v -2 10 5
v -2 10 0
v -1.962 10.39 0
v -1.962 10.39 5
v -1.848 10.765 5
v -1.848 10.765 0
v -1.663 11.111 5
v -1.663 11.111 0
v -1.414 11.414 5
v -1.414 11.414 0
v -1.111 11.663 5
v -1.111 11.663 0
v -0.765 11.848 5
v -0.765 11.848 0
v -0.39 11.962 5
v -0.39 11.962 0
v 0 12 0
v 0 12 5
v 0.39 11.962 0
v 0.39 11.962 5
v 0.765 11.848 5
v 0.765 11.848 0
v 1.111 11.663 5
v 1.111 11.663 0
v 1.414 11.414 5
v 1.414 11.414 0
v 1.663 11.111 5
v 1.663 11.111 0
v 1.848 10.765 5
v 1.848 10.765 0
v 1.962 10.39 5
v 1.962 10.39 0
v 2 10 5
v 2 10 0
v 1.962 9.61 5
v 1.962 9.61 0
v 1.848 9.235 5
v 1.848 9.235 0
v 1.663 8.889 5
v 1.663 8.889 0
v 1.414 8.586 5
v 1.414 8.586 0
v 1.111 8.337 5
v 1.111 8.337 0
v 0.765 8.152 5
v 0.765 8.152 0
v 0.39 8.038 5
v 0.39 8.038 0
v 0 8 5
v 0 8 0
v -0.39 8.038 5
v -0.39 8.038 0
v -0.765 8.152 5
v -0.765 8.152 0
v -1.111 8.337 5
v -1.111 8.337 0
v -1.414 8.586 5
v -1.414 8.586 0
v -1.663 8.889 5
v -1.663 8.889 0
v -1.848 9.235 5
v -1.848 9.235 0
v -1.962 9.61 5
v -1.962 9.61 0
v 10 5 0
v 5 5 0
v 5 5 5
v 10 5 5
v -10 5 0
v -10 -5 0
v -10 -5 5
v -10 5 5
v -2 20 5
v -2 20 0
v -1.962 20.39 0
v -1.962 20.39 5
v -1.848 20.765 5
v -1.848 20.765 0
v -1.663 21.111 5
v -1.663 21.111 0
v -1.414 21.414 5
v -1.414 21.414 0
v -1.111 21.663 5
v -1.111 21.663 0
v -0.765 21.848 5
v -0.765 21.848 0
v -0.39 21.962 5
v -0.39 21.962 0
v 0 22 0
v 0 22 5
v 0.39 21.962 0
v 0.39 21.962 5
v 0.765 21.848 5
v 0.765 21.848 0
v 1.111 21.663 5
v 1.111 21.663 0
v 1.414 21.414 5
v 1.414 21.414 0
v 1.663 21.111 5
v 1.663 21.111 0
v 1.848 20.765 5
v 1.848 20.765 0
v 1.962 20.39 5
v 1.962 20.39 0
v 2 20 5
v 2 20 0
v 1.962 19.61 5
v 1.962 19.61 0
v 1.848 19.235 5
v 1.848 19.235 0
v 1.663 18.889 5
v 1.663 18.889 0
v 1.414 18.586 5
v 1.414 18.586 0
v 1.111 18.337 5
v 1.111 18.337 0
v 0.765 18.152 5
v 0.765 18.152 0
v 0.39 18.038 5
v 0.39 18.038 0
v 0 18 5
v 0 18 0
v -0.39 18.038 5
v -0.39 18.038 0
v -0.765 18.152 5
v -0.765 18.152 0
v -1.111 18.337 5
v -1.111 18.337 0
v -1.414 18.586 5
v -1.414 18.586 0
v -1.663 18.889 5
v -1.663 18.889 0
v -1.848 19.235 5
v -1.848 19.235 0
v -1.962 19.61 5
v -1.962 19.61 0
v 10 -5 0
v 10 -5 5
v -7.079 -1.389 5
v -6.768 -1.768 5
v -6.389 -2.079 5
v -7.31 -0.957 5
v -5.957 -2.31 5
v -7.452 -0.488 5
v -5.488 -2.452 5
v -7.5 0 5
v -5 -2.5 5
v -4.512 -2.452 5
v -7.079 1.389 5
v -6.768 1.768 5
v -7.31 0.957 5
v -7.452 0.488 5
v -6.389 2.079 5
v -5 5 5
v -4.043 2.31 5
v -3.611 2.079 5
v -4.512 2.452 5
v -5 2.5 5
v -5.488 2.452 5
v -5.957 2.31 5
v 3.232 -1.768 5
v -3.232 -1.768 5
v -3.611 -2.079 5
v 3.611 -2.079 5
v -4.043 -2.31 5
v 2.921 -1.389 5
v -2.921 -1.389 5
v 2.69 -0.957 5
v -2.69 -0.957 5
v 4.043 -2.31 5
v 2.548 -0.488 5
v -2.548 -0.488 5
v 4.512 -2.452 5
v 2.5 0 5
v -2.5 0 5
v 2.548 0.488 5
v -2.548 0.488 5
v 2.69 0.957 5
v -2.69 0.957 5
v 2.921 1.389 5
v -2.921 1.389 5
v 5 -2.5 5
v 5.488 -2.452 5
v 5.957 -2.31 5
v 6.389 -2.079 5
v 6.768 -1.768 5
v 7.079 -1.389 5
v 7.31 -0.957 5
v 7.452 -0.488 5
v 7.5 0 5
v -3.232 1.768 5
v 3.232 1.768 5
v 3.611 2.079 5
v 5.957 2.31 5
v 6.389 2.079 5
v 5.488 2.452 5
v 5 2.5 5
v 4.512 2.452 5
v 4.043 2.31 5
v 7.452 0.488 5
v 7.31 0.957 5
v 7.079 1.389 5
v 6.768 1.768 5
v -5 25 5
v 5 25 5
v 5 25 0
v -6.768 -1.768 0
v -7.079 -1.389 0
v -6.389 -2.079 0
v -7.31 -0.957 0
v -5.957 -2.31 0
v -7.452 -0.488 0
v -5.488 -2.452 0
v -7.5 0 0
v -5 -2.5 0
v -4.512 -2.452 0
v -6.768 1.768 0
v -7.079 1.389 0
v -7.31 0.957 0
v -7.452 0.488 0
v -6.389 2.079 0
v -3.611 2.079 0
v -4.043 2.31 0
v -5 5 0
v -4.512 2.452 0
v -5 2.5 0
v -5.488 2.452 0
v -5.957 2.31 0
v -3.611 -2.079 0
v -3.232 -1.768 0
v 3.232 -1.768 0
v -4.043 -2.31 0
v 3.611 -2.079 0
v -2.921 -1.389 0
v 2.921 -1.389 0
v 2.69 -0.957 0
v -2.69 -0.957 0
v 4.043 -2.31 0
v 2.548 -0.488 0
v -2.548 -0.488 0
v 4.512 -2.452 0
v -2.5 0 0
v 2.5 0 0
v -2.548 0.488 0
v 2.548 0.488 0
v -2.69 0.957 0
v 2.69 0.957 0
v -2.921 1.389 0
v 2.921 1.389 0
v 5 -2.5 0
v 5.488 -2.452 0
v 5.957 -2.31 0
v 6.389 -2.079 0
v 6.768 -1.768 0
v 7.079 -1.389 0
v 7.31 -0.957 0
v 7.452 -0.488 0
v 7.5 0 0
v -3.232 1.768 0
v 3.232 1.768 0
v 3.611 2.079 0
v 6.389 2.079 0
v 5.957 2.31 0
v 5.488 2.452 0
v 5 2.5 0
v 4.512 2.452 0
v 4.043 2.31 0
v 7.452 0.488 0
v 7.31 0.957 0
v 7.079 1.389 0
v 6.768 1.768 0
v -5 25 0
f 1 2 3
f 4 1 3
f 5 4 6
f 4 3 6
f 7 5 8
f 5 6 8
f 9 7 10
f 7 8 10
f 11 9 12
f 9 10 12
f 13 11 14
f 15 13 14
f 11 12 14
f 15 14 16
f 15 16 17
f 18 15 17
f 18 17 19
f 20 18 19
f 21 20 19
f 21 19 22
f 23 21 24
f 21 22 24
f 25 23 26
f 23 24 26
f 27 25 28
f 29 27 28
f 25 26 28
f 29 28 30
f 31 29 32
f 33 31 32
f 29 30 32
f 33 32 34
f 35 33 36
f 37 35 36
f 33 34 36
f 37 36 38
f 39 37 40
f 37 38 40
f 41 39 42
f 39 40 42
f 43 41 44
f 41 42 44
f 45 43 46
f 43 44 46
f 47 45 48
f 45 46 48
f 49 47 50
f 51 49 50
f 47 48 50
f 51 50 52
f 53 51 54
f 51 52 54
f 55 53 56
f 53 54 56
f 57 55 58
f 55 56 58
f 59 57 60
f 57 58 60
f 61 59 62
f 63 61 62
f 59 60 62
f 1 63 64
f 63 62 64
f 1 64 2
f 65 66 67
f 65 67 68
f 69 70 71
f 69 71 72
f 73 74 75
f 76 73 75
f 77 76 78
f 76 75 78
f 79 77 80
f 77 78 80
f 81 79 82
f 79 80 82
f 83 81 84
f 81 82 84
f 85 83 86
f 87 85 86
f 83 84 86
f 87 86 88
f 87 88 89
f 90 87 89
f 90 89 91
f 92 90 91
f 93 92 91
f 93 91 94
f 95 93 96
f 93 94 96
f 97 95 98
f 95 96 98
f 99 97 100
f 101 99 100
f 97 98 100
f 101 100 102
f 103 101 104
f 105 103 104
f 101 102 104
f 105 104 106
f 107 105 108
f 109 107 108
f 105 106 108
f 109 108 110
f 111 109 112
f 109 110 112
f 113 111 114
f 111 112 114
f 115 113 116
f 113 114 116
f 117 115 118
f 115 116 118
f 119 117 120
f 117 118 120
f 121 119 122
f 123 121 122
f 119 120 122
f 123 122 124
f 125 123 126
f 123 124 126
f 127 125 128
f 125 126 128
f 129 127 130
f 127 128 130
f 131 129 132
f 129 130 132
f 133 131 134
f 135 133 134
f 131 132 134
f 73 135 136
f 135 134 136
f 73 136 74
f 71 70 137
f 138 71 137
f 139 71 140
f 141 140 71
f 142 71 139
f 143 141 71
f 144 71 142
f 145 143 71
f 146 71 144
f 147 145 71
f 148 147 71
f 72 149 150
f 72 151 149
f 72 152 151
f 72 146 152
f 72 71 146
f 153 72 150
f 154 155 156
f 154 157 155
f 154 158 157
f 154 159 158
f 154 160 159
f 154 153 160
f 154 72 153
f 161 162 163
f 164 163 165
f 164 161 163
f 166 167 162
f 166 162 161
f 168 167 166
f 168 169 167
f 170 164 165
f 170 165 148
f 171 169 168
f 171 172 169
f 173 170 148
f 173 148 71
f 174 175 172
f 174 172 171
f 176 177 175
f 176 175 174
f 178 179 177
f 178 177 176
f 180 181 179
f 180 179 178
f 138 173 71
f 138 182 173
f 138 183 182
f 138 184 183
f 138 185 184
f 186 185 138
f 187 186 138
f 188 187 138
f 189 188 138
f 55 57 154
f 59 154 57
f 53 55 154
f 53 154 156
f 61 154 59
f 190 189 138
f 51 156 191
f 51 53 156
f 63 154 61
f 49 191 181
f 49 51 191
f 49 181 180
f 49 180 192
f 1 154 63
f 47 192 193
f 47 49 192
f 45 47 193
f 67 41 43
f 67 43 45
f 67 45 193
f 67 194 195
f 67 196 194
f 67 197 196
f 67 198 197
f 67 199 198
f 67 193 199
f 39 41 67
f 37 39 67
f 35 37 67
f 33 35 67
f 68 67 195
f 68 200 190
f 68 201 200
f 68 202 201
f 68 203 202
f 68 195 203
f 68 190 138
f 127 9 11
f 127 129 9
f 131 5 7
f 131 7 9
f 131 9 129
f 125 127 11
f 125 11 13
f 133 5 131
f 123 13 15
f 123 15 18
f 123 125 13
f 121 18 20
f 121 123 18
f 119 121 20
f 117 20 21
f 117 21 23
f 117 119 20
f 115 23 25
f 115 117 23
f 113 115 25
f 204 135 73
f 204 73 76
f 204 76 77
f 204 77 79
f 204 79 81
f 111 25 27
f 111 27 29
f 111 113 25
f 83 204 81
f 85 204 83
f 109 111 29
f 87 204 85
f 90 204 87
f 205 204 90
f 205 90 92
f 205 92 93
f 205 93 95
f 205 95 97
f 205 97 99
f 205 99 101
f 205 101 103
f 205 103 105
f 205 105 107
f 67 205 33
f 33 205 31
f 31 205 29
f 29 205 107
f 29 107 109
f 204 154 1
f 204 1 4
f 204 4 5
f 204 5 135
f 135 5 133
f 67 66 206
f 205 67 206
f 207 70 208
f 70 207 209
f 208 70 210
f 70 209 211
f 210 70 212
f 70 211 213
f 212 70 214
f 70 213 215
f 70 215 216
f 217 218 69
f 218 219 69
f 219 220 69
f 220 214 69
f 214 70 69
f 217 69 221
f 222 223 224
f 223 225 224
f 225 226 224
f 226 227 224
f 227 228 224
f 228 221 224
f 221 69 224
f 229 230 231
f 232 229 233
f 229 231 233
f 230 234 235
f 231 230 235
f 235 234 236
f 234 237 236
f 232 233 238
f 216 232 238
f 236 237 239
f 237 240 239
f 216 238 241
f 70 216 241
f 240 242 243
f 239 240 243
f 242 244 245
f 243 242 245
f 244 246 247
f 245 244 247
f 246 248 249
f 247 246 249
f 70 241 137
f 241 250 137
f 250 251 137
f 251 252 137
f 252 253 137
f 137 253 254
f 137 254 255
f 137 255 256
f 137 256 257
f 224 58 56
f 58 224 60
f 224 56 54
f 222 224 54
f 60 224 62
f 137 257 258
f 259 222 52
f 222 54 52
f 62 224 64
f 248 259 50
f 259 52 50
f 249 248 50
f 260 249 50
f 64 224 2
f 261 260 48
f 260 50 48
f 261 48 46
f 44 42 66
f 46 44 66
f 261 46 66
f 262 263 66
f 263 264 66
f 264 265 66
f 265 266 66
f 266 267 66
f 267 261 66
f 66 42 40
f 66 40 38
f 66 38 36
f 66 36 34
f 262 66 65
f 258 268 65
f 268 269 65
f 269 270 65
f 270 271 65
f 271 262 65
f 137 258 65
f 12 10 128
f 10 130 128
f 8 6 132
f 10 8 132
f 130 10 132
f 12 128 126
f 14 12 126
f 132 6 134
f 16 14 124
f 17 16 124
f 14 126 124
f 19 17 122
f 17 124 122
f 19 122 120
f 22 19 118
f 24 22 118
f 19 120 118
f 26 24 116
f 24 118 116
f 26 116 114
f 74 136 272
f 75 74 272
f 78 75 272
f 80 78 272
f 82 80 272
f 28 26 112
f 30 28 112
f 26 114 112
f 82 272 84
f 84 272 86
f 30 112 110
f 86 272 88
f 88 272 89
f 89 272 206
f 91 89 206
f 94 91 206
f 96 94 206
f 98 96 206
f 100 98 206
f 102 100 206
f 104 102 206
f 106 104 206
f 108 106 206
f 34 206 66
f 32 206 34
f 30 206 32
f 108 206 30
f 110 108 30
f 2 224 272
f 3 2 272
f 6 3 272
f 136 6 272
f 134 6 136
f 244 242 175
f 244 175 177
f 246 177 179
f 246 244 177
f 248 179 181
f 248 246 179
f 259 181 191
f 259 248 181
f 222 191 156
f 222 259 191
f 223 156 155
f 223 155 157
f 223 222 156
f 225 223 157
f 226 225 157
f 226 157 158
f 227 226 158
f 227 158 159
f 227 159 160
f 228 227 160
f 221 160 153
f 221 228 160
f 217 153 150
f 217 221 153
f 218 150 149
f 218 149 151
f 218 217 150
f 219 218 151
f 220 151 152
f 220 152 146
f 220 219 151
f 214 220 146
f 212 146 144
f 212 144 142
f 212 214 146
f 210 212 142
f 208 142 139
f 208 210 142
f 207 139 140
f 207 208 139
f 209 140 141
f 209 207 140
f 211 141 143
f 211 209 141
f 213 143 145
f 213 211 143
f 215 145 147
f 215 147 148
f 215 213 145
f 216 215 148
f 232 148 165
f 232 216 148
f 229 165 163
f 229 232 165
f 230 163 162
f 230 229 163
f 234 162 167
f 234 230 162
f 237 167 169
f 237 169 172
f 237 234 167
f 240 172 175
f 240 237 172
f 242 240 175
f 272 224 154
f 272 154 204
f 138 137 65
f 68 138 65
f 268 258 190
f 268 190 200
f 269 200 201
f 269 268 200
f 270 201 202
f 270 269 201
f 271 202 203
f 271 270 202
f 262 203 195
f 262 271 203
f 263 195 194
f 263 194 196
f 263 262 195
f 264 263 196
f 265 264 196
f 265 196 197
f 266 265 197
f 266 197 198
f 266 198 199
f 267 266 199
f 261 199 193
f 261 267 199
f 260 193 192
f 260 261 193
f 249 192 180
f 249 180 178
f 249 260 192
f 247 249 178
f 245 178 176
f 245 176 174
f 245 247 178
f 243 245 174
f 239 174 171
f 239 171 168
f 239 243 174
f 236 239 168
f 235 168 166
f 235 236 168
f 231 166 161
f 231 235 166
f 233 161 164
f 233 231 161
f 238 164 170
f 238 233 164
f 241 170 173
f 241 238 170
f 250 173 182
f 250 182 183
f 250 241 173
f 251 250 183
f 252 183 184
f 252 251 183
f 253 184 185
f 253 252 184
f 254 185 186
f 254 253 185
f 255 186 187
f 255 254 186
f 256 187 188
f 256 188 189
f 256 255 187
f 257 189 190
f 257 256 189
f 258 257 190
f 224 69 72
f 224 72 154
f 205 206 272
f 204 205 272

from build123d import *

# Parameters (mm, degrees)
SKETCH_1_W      = 20
SKETCH_1_H      = 10
SKETCH_1_R      = 2.5
EXTRUDE_1_DEPTH = 5
SKETCH_2_W      = 10
SKETCH_2_H      = 20
SKETCH_2_R      = 2
EXTRUDE_2_DEPTH = 5


with BuildPart() as part:
    # 草图1 → 凸台-拉伸1 (new body)
    with BuildSketch(Plane.XY):
        Rectangle(SKETCH_1_W, SKETCH_1_H)
        with Locations((-5, 0)):
            Circle(SKETCH_1_R, mode=Mode.SUBTRACT)
        with Locations((5, 0)):
            Circle(SKETCH_1_R, mode=Mode.SUBTRACT)
    extrude(amount=EXTRUDE_1_DEPTH)

    # 草图2 → 凸台-拉伸2 (add)
    with BuildSketch(Plane(origin=(0, 0, 0), x_dir=(-1, 0, 0), z_dir=(0, 0, -1))):
        with Locations((0, 15)):
            Rectangle(SKETCH_2_W, SKETCH_2_H)
        with Locations((0, 20)):
            Circle(SKETCH_2_R, mode=Mode.SUBTRACT)
        with Locations((0, 10)):
            Circle(SKETCH_2_R, mode=Mode.SUBTRACT)
    extrude(amount=-EXTRUDE_2_DEPTH)


solid = part.part
